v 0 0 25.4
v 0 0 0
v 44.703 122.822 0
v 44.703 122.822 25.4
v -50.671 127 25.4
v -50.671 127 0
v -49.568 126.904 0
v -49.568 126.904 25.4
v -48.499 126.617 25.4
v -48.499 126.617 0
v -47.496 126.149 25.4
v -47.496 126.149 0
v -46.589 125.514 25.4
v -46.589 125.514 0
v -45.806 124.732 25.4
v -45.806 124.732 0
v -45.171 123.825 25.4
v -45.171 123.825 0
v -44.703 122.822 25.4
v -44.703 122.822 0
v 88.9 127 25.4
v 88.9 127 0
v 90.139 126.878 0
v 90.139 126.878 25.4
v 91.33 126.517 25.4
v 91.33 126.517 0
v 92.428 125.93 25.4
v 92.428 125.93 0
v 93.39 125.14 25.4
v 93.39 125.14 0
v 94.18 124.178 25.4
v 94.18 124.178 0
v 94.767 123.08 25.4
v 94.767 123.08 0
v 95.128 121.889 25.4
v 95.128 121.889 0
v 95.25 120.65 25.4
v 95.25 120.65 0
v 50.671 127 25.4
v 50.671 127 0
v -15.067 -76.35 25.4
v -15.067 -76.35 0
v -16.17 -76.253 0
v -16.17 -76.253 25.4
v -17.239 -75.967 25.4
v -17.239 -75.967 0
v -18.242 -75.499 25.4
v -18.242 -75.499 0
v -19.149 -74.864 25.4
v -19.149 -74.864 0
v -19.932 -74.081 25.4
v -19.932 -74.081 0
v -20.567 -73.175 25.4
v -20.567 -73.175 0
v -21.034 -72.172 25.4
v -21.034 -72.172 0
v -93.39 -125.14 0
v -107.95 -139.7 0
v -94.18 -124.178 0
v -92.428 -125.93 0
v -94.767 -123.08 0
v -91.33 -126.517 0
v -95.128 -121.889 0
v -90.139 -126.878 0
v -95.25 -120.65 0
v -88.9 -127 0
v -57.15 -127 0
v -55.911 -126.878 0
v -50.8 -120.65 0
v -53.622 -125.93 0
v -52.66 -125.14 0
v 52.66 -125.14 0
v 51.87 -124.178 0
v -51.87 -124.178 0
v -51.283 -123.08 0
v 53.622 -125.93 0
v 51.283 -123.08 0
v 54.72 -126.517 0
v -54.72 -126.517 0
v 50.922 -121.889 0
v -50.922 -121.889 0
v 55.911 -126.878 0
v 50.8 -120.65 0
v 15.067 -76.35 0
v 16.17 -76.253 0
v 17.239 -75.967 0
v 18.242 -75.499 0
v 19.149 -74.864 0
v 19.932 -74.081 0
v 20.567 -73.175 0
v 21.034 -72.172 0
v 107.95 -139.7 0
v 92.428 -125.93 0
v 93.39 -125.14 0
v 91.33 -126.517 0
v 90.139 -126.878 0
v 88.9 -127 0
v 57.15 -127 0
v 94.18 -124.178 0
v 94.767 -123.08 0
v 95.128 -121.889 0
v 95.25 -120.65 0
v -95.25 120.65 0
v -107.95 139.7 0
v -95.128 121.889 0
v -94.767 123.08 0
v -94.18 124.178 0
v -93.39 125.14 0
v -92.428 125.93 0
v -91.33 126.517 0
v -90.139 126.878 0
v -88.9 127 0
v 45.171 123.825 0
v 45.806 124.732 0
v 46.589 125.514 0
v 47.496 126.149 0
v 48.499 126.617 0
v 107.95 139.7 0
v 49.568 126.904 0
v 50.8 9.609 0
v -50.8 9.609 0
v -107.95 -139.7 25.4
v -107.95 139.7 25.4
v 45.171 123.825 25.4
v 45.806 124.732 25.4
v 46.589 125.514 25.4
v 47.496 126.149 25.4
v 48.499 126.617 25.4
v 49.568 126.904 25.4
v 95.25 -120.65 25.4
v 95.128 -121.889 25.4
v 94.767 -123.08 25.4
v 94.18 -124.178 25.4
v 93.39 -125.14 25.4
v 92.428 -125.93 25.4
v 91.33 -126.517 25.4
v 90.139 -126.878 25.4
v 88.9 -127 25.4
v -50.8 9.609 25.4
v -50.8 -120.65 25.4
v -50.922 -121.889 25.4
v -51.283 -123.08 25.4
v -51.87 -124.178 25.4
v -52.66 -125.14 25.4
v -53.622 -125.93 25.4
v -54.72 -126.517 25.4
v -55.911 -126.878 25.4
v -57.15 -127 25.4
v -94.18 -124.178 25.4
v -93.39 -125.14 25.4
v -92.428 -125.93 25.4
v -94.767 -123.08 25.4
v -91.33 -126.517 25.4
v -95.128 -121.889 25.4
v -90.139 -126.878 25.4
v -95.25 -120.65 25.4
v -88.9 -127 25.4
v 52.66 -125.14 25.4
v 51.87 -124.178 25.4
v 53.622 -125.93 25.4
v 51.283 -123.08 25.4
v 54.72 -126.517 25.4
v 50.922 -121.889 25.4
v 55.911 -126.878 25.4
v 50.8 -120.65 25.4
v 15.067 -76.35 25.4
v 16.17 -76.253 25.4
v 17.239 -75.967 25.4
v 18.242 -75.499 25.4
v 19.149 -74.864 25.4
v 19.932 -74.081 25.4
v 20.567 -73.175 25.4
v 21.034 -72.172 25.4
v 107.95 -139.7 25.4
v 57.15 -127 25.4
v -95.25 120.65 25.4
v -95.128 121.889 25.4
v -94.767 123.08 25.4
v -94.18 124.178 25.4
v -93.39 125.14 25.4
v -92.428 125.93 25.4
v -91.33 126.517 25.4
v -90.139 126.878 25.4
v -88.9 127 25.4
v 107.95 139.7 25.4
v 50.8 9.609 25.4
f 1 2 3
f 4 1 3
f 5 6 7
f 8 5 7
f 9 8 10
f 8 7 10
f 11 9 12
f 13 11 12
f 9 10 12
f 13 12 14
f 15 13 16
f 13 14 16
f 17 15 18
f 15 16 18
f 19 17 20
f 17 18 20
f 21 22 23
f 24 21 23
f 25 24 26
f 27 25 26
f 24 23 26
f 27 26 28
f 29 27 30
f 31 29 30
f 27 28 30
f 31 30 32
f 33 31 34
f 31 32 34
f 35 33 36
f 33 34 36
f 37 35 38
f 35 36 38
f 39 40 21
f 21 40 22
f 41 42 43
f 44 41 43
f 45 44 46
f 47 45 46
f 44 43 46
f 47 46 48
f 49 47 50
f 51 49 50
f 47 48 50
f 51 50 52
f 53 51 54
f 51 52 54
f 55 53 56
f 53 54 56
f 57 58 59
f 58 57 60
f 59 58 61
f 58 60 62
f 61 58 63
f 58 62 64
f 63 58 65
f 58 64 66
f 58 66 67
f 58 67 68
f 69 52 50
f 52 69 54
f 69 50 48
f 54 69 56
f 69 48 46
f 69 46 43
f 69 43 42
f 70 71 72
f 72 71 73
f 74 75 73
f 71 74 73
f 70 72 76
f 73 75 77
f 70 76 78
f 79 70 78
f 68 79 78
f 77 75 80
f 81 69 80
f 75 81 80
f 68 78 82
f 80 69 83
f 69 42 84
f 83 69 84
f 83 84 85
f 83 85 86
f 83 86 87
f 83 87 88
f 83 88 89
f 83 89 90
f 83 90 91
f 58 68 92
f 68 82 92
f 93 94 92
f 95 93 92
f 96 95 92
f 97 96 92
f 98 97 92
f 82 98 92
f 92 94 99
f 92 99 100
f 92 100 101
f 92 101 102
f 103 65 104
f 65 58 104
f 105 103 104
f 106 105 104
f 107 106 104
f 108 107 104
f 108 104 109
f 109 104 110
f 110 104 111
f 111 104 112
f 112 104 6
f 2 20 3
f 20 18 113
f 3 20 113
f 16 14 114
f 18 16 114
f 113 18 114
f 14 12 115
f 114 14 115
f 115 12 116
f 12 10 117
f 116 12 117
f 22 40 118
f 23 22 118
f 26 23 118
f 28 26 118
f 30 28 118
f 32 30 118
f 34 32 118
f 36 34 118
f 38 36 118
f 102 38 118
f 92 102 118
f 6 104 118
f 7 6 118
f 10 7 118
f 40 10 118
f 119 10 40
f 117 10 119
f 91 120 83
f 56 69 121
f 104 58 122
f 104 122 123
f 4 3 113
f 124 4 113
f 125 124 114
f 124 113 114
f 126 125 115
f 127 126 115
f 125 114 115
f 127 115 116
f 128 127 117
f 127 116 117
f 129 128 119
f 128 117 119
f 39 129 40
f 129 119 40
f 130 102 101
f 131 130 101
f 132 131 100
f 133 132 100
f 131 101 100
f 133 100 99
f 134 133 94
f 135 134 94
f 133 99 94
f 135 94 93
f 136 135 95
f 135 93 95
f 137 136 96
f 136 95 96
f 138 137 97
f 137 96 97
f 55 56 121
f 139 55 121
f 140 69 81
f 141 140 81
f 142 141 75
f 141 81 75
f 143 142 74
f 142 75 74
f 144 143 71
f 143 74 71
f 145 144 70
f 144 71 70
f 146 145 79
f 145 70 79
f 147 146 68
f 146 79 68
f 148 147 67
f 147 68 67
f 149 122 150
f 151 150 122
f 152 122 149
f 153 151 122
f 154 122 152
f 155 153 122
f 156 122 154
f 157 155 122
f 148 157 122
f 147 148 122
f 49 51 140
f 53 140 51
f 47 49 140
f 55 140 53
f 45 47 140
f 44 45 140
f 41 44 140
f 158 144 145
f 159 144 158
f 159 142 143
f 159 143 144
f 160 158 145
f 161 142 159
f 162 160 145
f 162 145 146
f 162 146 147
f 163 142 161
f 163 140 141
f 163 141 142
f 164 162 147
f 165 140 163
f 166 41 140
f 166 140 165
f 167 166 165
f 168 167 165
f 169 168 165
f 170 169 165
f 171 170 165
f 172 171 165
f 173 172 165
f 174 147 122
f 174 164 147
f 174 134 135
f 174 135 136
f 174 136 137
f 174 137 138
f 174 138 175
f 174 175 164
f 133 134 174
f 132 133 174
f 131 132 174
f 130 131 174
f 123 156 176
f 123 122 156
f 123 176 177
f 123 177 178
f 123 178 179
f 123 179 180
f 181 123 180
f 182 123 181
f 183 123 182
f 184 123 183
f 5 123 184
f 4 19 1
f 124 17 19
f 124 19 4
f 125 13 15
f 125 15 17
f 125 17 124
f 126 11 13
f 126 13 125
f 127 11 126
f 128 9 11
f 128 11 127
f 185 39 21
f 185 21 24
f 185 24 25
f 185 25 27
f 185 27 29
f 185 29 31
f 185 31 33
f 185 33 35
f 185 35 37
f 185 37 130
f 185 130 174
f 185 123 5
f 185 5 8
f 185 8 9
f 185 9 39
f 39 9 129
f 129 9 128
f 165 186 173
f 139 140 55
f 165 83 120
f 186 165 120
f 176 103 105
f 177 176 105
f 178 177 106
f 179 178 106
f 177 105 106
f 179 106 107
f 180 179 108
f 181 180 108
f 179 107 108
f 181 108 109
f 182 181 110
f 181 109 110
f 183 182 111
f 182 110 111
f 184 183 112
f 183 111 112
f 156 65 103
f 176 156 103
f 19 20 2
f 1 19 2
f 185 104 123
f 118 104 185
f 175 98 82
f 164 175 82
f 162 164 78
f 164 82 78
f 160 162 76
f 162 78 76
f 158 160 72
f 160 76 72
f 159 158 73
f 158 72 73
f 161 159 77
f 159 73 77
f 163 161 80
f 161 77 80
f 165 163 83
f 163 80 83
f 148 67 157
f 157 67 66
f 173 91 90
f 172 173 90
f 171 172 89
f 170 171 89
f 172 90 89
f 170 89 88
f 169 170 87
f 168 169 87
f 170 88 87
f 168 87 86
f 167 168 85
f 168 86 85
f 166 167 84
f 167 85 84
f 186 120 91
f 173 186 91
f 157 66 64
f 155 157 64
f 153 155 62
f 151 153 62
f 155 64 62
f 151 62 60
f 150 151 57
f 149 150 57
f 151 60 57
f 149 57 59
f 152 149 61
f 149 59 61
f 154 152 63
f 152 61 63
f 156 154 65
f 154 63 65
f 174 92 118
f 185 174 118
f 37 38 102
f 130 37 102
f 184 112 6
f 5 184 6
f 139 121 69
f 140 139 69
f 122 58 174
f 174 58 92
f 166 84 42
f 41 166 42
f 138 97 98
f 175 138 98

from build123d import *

# Parameters (mm, degrees)
F0_W     = 215.9
F0_H     = 279.4
F1_DEPTH = 25.4


with BuildPart() as f1:
    # F0 (on Top) → F1 (new body)
    with BuildSketch(Plane.XY):
        Rectangle(F0_W, F0_H)
        with BuildLine():
            Line((-95.25, -120.65), (-95.25, 120.65))
            ThreePointArc((-95.25, 120.65), (-93.390128, 125.140128), (-88.9, 127))
            Line((-88.9, 127), (-50.670538, 127))
            ThreePointArc((-50.670538, 127), (-47.028327, 125.851615), (-44.703489, 122.821828))
            Line((-44.703489, 122.821828), (0, 0))
            Line((0, 0), (44.703489, 122.821828))
            ThreePointArc((44.703489, 122.821828), (47.028327, 125.851615), (50.670538, 127))
            Line((50.670538, 127), (88.9, 127))
            ThreePointArc((88.9, 127), (93.390128, 125.140128), (95.25, 120.65))
            Line((95.25, 120.65), (95.25, -120.65))
            ThreePointArc((95.25, -120.65), (93.390128, -125.140128), (88.9, -127))
            Line((88.9, -127), (57.15, -127))
            ThreePointArc((57.15, -127), (52.659872, -125.140128), (50.8, -120.65))
            Line((50.8, -120.65), (50.8, 9.608747))
            Line((50.8, 9.608747), (21.034386, -72.171606))
            ThreePointArc((21.034386, -72.171606), (18.709548, -75.201393), (15.067338, -76.349778))
            Line((15.067338, -76.349778), (0, -76.349778))
            Line((0, -76.349778), (-15.067338, -76.349778))
            ThreePointArc((-15.067338, -76.349778), (-18.709548, -75.201393), (-21.034386, -72.171606))
            Line((-21.034386, -72.171606), (-50.8, 9.608747))
            Line((-50.8, 9.608747), (-50.8, -120.65))
            ThreePointArc((-50.8, -120.65), (-52.659872, -125.140128), (-57.15, -127))
            Line((-57.15, -127), (-88.9, -127))
            ThreePointArc((-88.9, -127), (-93.390128, -125.140128), (-95.25, -120.65))
        make_face(mode=Mode.SUBTRACT)
    extrude(amount=F1_DEPTH)


solid = f1.part
